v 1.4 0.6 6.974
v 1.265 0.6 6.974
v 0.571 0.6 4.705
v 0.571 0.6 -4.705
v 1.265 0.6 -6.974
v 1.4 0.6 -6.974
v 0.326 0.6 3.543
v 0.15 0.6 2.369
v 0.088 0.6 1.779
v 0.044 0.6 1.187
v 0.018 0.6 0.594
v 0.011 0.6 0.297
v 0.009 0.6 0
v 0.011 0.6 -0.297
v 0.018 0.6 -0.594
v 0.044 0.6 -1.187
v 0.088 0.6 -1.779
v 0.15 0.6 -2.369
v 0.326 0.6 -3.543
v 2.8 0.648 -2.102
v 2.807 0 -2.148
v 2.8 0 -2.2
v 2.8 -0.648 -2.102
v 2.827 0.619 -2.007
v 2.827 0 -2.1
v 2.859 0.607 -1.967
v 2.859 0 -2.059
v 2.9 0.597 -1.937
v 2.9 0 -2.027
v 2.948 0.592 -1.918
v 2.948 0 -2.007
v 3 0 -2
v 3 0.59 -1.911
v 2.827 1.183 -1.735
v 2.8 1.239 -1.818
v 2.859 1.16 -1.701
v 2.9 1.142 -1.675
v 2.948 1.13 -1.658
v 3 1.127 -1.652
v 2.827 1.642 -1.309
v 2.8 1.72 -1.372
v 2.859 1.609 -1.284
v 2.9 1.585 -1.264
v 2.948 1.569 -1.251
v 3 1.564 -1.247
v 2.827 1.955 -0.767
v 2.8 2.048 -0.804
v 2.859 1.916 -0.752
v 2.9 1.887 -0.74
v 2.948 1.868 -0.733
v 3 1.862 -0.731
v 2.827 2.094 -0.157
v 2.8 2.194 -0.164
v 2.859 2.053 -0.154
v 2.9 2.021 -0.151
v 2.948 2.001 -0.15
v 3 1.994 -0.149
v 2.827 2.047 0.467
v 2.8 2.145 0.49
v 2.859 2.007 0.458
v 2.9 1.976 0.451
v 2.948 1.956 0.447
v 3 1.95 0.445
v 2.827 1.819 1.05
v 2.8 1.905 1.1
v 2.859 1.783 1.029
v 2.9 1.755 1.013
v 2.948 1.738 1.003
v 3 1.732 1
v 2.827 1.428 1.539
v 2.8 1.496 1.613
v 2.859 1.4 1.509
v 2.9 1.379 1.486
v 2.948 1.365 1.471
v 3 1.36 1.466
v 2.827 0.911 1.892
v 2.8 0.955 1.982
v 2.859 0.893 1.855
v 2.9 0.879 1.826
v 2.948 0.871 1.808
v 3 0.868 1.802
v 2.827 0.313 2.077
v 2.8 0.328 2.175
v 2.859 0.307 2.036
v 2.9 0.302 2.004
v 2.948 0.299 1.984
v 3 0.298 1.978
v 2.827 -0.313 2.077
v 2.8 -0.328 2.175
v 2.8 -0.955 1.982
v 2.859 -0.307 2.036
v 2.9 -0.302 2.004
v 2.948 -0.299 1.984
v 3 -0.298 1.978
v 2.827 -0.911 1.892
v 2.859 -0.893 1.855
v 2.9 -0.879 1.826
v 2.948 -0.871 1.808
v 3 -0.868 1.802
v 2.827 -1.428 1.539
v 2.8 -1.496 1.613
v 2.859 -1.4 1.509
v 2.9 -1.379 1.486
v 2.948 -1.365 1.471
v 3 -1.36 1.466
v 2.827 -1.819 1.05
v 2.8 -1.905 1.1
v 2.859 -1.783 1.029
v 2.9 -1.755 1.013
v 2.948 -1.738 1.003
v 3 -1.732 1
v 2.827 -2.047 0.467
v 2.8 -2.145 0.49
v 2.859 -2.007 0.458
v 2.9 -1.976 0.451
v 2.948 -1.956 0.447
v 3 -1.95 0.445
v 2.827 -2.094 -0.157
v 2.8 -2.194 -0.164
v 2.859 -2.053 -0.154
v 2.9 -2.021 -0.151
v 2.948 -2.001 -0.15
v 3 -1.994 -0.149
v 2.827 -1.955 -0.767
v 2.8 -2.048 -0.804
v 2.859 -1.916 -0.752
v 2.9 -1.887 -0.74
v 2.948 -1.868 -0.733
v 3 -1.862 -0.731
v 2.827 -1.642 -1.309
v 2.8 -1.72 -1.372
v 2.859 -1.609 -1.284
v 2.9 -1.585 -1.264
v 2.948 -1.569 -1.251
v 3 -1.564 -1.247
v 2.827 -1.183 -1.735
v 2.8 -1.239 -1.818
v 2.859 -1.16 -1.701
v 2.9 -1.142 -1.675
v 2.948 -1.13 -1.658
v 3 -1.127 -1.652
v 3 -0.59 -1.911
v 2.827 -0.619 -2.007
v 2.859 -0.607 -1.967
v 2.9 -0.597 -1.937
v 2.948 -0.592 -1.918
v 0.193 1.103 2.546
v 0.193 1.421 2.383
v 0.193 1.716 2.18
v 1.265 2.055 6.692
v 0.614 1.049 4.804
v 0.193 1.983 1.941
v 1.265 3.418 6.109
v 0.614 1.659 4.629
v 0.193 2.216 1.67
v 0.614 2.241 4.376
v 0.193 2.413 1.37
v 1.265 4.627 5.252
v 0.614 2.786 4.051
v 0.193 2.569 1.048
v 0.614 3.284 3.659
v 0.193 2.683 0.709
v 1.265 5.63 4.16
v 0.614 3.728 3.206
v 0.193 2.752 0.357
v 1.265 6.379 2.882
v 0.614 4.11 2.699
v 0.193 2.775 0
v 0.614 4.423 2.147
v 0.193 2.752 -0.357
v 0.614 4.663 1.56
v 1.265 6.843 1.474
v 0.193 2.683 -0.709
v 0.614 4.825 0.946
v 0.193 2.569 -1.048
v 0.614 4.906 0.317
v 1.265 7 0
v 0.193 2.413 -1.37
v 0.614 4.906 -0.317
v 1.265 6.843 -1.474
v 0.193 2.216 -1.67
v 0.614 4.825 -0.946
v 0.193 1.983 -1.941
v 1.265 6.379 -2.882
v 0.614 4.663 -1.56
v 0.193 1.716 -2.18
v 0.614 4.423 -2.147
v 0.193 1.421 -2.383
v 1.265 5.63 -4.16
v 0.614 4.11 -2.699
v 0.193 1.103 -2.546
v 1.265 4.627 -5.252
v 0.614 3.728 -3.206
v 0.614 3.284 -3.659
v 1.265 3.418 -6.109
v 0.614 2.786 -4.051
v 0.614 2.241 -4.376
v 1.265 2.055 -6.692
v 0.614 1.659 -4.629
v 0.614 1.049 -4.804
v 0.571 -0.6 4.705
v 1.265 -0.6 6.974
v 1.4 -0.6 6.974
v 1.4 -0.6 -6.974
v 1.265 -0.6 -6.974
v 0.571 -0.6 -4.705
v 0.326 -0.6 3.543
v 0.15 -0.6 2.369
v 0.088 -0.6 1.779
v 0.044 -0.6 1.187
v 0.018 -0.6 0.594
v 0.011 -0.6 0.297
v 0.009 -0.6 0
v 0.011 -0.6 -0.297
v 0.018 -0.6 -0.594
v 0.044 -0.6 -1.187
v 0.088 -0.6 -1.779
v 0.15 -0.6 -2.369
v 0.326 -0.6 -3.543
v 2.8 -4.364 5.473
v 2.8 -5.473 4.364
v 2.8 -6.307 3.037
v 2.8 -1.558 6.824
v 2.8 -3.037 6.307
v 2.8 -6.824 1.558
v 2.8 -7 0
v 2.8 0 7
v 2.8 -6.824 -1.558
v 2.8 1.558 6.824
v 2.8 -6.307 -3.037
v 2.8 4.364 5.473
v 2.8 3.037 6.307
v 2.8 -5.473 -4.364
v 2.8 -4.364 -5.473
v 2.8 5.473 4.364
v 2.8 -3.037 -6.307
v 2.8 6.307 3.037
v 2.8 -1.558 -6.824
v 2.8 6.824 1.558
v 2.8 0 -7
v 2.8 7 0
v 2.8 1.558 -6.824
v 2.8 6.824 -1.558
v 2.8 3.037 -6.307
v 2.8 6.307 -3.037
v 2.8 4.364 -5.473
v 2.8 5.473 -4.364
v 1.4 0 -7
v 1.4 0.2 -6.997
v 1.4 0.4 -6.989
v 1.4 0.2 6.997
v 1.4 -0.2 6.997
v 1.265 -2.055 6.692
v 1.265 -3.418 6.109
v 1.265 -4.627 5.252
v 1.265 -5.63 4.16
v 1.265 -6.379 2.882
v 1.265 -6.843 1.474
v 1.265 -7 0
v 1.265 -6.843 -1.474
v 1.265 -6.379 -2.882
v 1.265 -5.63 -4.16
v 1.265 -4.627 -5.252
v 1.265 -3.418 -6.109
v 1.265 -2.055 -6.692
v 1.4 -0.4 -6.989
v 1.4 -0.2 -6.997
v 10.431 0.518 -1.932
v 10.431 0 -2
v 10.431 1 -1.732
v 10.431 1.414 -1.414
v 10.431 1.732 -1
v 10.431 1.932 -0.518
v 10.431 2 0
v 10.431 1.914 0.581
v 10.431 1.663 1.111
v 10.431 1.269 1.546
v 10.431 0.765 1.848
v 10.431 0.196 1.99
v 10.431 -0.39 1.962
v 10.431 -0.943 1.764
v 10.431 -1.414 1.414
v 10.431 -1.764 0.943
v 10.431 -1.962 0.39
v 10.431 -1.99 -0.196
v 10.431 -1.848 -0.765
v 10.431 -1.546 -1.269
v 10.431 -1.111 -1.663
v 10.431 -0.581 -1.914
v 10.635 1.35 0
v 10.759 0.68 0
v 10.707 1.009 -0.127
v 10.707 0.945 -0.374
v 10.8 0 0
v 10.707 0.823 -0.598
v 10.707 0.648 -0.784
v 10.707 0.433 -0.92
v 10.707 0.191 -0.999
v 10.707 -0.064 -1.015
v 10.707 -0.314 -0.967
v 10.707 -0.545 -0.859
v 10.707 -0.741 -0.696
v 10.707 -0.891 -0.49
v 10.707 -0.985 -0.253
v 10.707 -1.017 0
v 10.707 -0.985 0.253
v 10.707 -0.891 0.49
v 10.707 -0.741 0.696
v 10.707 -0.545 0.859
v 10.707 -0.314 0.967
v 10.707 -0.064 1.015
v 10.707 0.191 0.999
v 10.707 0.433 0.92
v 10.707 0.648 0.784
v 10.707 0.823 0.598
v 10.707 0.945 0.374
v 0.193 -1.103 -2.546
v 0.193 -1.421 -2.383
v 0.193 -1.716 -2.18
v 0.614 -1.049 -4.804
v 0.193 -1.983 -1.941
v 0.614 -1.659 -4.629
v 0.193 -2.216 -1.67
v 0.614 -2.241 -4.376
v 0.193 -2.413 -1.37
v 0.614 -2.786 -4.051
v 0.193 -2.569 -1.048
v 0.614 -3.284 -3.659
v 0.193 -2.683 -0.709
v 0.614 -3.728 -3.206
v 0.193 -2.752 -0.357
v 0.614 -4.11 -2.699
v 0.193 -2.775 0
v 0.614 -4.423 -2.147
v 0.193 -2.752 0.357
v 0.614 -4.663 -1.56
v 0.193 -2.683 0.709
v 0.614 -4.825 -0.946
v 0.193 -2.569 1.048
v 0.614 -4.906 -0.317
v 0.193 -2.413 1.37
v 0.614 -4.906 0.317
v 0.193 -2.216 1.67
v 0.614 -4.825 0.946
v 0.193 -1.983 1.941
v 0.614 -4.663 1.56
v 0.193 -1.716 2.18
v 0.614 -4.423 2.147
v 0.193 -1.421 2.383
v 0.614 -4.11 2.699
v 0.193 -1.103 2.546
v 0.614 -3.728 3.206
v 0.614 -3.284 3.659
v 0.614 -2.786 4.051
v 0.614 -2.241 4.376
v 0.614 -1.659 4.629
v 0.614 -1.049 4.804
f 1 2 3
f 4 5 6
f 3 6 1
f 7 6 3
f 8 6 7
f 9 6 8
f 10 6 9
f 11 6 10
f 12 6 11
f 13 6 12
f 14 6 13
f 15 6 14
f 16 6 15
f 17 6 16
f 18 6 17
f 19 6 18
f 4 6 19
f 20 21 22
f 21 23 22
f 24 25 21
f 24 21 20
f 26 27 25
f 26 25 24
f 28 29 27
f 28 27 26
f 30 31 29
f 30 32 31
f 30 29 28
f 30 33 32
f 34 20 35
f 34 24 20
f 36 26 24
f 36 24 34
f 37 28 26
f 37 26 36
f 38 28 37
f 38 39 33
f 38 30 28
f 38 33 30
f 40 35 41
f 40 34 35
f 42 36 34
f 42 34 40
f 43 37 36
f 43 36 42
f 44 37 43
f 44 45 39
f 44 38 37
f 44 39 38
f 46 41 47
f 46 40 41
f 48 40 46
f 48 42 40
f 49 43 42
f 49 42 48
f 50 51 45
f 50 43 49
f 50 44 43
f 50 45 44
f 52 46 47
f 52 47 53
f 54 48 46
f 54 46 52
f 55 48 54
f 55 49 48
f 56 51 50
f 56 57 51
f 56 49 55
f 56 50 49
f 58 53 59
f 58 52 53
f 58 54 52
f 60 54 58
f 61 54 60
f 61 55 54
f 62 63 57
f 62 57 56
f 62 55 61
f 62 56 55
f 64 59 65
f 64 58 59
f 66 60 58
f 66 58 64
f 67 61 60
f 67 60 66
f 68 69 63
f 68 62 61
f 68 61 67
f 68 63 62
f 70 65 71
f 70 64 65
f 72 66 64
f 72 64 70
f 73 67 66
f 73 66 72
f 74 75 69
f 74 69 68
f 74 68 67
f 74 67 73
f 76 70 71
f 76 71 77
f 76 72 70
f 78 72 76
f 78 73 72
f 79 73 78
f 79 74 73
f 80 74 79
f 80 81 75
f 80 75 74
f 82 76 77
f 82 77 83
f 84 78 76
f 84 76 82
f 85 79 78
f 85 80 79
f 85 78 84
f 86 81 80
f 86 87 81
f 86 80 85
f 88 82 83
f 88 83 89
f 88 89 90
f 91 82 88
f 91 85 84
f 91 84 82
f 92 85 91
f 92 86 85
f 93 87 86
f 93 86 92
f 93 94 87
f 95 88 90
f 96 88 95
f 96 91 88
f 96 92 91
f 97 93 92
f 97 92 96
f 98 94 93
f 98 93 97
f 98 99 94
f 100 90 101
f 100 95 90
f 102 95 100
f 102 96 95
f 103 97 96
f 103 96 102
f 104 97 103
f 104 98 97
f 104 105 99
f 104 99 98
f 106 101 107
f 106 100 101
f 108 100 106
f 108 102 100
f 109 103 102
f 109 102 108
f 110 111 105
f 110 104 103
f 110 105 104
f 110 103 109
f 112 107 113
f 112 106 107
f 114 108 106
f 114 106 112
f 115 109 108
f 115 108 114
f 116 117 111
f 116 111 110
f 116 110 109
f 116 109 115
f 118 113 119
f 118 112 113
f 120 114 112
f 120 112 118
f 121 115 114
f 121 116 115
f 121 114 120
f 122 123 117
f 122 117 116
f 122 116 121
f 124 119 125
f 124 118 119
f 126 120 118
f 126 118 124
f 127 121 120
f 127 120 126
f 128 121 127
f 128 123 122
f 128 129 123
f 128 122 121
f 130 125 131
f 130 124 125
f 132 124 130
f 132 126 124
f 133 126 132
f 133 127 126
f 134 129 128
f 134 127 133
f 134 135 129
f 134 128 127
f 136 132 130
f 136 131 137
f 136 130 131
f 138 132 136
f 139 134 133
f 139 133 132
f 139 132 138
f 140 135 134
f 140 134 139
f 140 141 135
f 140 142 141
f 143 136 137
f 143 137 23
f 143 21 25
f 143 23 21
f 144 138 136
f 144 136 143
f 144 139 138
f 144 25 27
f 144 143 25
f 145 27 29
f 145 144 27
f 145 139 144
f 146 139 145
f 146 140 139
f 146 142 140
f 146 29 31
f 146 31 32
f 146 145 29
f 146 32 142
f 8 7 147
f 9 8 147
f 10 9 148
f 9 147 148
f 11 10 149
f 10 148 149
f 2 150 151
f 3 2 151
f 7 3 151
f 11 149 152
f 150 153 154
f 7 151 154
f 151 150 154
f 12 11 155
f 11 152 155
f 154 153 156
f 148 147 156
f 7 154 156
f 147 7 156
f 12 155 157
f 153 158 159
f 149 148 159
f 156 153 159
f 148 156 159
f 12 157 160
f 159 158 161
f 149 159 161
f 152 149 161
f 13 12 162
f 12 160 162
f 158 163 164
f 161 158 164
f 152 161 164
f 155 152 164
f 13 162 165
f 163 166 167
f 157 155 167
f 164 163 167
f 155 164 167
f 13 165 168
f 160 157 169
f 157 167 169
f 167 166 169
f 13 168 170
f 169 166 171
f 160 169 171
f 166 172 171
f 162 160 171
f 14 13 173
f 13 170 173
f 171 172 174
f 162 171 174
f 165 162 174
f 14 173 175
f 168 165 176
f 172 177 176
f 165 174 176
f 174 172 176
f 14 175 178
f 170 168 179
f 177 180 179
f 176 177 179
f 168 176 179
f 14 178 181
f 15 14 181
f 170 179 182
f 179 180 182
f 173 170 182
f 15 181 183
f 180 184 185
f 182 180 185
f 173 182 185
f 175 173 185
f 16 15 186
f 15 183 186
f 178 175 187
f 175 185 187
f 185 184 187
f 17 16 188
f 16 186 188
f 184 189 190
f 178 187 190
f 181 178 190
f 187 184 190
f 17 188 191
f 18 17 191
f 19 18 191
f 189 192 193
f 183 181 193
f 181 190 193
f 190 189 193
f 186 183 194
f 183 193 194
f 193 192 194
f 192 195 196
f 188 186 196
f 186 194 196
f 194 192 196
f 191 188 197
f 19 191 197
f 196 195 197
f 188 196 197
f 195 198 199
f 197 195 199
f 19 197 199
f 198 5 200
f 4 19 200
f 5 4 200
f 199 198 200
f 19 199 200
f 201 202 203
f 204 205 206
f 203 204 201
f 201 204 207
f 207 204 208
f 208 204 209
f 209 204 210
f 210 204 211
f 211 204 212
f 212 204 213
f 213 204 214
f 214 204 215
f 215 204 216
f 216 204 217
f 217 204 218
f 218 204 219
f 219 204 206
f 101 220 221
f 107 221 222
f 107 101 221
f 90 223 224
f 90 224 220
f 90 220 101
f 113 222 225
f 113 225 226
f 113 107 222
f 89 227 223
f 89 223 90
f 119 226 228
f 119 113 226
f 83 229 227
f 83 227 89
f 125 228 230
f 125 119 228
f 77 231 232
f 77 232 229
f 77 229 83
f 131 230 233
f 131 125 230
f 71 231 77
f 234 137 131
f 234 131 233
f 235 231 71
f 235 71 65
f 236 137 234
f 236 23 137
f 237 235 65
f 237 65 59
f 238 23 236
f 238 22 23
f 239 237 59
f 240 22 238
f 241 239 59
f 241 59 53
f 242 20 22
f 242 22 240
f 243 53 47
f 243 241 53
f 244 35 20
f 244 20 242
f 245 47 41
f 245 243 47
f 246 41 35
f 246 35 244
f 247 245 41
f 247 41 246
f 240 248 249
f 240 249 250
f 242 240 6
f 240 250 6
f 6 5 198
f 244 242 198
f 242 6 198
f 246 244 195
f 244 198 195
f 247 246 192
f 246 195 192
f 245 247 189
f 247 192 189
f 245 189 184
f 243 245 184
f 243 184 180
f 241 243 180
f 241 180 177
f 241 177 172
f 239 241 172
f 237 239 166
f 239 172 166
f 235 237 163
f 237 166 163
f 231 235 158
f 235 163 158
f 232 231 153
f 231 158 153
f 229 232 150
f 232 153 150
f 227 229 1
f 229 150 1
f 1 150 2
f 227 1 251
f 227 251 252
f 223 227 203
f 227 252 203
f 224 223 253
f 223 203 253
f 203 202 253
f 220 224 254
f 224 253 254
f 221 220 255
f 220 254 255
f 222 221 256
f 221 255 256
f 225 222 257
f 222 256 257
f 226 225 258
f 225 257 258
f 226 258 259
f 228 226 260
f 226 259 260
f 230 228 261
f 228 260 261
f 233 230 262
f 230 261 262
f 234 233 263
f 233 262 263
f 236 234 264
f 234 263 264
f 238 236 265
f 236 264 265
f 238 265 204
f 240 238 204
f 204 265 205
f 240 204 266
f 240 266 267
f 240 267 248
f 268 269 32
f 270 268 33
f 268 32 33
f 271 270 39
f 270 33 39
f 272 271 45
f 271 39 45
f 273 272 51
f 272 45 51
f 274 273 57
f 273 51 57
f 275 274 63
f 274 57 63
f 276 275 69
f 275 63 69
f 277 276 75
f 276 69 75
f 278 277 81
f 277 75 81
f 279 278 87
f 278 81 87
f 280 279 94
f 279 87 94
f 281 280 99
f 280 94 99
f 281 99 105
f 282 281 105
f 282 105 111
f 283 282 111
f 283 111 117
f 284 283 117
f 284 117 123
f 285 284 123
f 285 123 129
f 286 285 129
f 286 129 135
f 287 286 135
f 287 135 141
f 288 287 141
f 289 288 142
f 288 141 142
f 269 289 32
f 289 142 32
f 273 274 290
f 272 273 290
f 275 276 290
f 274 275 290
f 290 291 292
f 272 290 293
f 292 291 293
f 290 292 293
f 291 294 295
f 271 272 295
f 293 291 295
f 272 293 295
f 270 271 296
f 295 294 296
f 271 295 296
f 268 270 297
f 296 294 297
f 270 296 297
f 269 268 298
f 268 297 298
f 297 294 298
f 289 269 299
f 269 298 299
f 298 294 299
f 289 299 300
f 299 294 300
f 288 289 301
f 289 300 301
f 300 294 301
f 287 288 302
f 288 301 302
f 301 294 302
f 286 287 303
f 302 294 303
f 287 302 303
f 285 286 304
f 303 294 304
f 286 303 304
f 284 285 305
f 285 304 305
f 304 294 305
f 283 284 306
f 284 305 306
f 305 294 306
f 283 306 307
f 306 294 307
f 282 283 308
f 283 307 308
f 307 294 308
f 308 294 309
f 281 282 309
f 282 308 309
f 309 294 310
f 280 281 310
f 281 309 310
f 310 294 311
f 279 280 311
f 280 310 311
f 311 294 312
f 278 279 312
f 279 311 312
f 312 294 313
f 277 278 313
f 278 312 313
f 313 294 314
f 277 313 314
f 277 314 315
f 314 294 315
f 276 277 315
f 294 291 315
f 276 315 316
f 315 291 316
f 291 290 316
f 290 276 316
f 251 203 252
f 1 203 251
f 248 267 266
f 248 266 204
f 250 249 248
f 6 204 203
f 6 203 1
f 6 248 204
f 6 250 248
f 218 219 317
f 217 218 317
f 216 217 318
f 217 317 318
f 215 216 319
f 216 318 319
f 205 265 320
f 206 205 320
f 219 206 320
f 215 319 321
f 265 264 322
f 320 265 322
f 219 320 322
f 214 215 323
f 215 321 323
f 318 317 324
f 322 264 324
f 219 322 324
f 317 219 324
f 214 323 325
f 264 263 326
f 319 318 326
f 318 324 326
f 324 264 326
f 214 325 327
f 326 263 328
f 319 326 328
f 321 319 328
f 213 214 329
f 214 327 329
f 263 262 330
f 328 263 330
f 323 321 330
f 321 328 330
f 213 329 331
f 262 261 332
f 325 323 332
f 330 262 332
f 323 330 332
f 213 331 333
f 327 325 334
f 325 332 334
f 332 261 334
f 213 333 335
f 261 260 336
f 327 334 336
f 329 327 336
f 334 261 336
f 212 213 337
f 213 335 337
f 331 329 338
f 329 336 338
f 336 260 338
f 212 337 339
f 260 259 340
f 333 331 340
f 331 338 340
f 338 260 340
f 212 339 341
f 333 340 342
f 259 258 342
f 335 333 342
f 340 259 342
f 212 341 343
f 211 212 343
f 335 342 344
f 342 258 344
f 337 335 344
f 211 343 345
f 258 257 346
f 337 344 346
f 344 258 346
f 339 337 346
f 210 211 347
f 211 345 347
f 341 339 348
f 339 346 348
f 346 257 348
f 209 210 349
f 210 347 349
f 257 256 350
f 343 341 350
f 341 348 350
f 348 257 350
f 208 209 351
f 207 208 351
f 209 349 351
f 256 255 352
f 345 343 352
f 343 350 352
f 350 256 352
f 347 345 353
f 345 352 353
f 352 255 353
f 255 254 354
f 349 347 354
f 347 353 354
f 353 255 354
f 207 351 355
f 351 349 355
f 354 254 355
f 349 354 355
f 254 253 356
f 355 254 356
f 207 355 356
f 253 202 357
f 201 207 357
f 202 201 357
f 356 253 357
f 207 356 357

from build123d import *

# Parameters (mm, degrees)
SKETCH1_R       = 7
BASEHEAD_DEPTH  = 2.8
SKETCH2_R       = 2
BASEBODY_DEPTH  = 8
SLOT_DEPTH      = 15.650597257
SLOT_DEPTH_BACK = 15.650597257
SKETCH3_W       = 1.4
SKETCH3_H       = 1.2
HEADFILLET_R    = 0.2


with BuildPart() as part:
    # Sketch1 → BaseHead (new body)
    with BuildSketch(Plane(origin=(0, 0, 0), x_dir=(0, 0, -1), z_dir=(1, 0, 0))):
        Circle(SKETCH1_R)
    extrude(amount=BASEHEAD_DEPTH)

    # Sketch2 → BaseBody (add)
    with BuildSketch(Plane(origin=(2.8, 0.067556317, 0.30150137), x_dir=(0, 0, -1), z_dir=(1, 0, 0))):
        with Locations((0.30150137, -0.067556317)):
            Circle(SKETCH2_R)
    extrude(amount=BASEBODY_DEPTH)

    # Sketch3 → Slot (cut, two sides: drawn at the far end of the back side and taken through both)
    with BuildSketch(Plane.XY.offset(-SLOT_DEPTH_BACK)):
        with Locations((0.7, 0)):
            Rectangle(SKETCH3_W, SKETCH3_H)
    extrude(amount=SLOT_DEPTH + SLOT_DEPTH_BACK, mode=Mode.SUBTRACT)

    # Sketch4 → BaseTop (revolve, cut)
    with BuildSketch(Plane(origin=(-5.763764327, 3.913764327, 0), x_dir=(0, -1, 0), z_dir=(0, 0, 1))):
        with BuildLine():
            Line((1.913764327, 18.563764327), (1.913764327, 16.194443059))
            ThreePointArc((1.913764327, 16.194443059), (2.896857473, 16.470660045), (3.913764327, 16.563764327))
            Line((3.913764327, 16.563764327), (3.913764327, 18.563764327))
            Line((3.913764327, 18.563764327), (1.913764327, 18.563764327))
        make_face()
        with BuildLine():
            Line((-3.086235673, 3.763764327), (3.913764327, 3.763764327))
            Line((3.913764327, 3.763764327), (3.913764327, 5.763764327))
            ThreePointArc((3.913764327, 5.763764327), (0.357072037, 6.08255654), (-3.086235673, 7.028770332))
            Line((-3.086235673, 7.028770332), (-3.086235673, 3.763764327))
        make_face()
    revolve(axis=Axis((9.335097479, 0, 0), (-1, 0, 0)), mode=Mode.SUBTRACT)

    # HeadFillet
    headfillet_edges = [part.edges().sort_by_distance(p)[0] for p in [
        (2.8, 0, 2),
    ]]
    fillet(headfillet_edges, radius=HEADFILLET_R)


solid = part.part
